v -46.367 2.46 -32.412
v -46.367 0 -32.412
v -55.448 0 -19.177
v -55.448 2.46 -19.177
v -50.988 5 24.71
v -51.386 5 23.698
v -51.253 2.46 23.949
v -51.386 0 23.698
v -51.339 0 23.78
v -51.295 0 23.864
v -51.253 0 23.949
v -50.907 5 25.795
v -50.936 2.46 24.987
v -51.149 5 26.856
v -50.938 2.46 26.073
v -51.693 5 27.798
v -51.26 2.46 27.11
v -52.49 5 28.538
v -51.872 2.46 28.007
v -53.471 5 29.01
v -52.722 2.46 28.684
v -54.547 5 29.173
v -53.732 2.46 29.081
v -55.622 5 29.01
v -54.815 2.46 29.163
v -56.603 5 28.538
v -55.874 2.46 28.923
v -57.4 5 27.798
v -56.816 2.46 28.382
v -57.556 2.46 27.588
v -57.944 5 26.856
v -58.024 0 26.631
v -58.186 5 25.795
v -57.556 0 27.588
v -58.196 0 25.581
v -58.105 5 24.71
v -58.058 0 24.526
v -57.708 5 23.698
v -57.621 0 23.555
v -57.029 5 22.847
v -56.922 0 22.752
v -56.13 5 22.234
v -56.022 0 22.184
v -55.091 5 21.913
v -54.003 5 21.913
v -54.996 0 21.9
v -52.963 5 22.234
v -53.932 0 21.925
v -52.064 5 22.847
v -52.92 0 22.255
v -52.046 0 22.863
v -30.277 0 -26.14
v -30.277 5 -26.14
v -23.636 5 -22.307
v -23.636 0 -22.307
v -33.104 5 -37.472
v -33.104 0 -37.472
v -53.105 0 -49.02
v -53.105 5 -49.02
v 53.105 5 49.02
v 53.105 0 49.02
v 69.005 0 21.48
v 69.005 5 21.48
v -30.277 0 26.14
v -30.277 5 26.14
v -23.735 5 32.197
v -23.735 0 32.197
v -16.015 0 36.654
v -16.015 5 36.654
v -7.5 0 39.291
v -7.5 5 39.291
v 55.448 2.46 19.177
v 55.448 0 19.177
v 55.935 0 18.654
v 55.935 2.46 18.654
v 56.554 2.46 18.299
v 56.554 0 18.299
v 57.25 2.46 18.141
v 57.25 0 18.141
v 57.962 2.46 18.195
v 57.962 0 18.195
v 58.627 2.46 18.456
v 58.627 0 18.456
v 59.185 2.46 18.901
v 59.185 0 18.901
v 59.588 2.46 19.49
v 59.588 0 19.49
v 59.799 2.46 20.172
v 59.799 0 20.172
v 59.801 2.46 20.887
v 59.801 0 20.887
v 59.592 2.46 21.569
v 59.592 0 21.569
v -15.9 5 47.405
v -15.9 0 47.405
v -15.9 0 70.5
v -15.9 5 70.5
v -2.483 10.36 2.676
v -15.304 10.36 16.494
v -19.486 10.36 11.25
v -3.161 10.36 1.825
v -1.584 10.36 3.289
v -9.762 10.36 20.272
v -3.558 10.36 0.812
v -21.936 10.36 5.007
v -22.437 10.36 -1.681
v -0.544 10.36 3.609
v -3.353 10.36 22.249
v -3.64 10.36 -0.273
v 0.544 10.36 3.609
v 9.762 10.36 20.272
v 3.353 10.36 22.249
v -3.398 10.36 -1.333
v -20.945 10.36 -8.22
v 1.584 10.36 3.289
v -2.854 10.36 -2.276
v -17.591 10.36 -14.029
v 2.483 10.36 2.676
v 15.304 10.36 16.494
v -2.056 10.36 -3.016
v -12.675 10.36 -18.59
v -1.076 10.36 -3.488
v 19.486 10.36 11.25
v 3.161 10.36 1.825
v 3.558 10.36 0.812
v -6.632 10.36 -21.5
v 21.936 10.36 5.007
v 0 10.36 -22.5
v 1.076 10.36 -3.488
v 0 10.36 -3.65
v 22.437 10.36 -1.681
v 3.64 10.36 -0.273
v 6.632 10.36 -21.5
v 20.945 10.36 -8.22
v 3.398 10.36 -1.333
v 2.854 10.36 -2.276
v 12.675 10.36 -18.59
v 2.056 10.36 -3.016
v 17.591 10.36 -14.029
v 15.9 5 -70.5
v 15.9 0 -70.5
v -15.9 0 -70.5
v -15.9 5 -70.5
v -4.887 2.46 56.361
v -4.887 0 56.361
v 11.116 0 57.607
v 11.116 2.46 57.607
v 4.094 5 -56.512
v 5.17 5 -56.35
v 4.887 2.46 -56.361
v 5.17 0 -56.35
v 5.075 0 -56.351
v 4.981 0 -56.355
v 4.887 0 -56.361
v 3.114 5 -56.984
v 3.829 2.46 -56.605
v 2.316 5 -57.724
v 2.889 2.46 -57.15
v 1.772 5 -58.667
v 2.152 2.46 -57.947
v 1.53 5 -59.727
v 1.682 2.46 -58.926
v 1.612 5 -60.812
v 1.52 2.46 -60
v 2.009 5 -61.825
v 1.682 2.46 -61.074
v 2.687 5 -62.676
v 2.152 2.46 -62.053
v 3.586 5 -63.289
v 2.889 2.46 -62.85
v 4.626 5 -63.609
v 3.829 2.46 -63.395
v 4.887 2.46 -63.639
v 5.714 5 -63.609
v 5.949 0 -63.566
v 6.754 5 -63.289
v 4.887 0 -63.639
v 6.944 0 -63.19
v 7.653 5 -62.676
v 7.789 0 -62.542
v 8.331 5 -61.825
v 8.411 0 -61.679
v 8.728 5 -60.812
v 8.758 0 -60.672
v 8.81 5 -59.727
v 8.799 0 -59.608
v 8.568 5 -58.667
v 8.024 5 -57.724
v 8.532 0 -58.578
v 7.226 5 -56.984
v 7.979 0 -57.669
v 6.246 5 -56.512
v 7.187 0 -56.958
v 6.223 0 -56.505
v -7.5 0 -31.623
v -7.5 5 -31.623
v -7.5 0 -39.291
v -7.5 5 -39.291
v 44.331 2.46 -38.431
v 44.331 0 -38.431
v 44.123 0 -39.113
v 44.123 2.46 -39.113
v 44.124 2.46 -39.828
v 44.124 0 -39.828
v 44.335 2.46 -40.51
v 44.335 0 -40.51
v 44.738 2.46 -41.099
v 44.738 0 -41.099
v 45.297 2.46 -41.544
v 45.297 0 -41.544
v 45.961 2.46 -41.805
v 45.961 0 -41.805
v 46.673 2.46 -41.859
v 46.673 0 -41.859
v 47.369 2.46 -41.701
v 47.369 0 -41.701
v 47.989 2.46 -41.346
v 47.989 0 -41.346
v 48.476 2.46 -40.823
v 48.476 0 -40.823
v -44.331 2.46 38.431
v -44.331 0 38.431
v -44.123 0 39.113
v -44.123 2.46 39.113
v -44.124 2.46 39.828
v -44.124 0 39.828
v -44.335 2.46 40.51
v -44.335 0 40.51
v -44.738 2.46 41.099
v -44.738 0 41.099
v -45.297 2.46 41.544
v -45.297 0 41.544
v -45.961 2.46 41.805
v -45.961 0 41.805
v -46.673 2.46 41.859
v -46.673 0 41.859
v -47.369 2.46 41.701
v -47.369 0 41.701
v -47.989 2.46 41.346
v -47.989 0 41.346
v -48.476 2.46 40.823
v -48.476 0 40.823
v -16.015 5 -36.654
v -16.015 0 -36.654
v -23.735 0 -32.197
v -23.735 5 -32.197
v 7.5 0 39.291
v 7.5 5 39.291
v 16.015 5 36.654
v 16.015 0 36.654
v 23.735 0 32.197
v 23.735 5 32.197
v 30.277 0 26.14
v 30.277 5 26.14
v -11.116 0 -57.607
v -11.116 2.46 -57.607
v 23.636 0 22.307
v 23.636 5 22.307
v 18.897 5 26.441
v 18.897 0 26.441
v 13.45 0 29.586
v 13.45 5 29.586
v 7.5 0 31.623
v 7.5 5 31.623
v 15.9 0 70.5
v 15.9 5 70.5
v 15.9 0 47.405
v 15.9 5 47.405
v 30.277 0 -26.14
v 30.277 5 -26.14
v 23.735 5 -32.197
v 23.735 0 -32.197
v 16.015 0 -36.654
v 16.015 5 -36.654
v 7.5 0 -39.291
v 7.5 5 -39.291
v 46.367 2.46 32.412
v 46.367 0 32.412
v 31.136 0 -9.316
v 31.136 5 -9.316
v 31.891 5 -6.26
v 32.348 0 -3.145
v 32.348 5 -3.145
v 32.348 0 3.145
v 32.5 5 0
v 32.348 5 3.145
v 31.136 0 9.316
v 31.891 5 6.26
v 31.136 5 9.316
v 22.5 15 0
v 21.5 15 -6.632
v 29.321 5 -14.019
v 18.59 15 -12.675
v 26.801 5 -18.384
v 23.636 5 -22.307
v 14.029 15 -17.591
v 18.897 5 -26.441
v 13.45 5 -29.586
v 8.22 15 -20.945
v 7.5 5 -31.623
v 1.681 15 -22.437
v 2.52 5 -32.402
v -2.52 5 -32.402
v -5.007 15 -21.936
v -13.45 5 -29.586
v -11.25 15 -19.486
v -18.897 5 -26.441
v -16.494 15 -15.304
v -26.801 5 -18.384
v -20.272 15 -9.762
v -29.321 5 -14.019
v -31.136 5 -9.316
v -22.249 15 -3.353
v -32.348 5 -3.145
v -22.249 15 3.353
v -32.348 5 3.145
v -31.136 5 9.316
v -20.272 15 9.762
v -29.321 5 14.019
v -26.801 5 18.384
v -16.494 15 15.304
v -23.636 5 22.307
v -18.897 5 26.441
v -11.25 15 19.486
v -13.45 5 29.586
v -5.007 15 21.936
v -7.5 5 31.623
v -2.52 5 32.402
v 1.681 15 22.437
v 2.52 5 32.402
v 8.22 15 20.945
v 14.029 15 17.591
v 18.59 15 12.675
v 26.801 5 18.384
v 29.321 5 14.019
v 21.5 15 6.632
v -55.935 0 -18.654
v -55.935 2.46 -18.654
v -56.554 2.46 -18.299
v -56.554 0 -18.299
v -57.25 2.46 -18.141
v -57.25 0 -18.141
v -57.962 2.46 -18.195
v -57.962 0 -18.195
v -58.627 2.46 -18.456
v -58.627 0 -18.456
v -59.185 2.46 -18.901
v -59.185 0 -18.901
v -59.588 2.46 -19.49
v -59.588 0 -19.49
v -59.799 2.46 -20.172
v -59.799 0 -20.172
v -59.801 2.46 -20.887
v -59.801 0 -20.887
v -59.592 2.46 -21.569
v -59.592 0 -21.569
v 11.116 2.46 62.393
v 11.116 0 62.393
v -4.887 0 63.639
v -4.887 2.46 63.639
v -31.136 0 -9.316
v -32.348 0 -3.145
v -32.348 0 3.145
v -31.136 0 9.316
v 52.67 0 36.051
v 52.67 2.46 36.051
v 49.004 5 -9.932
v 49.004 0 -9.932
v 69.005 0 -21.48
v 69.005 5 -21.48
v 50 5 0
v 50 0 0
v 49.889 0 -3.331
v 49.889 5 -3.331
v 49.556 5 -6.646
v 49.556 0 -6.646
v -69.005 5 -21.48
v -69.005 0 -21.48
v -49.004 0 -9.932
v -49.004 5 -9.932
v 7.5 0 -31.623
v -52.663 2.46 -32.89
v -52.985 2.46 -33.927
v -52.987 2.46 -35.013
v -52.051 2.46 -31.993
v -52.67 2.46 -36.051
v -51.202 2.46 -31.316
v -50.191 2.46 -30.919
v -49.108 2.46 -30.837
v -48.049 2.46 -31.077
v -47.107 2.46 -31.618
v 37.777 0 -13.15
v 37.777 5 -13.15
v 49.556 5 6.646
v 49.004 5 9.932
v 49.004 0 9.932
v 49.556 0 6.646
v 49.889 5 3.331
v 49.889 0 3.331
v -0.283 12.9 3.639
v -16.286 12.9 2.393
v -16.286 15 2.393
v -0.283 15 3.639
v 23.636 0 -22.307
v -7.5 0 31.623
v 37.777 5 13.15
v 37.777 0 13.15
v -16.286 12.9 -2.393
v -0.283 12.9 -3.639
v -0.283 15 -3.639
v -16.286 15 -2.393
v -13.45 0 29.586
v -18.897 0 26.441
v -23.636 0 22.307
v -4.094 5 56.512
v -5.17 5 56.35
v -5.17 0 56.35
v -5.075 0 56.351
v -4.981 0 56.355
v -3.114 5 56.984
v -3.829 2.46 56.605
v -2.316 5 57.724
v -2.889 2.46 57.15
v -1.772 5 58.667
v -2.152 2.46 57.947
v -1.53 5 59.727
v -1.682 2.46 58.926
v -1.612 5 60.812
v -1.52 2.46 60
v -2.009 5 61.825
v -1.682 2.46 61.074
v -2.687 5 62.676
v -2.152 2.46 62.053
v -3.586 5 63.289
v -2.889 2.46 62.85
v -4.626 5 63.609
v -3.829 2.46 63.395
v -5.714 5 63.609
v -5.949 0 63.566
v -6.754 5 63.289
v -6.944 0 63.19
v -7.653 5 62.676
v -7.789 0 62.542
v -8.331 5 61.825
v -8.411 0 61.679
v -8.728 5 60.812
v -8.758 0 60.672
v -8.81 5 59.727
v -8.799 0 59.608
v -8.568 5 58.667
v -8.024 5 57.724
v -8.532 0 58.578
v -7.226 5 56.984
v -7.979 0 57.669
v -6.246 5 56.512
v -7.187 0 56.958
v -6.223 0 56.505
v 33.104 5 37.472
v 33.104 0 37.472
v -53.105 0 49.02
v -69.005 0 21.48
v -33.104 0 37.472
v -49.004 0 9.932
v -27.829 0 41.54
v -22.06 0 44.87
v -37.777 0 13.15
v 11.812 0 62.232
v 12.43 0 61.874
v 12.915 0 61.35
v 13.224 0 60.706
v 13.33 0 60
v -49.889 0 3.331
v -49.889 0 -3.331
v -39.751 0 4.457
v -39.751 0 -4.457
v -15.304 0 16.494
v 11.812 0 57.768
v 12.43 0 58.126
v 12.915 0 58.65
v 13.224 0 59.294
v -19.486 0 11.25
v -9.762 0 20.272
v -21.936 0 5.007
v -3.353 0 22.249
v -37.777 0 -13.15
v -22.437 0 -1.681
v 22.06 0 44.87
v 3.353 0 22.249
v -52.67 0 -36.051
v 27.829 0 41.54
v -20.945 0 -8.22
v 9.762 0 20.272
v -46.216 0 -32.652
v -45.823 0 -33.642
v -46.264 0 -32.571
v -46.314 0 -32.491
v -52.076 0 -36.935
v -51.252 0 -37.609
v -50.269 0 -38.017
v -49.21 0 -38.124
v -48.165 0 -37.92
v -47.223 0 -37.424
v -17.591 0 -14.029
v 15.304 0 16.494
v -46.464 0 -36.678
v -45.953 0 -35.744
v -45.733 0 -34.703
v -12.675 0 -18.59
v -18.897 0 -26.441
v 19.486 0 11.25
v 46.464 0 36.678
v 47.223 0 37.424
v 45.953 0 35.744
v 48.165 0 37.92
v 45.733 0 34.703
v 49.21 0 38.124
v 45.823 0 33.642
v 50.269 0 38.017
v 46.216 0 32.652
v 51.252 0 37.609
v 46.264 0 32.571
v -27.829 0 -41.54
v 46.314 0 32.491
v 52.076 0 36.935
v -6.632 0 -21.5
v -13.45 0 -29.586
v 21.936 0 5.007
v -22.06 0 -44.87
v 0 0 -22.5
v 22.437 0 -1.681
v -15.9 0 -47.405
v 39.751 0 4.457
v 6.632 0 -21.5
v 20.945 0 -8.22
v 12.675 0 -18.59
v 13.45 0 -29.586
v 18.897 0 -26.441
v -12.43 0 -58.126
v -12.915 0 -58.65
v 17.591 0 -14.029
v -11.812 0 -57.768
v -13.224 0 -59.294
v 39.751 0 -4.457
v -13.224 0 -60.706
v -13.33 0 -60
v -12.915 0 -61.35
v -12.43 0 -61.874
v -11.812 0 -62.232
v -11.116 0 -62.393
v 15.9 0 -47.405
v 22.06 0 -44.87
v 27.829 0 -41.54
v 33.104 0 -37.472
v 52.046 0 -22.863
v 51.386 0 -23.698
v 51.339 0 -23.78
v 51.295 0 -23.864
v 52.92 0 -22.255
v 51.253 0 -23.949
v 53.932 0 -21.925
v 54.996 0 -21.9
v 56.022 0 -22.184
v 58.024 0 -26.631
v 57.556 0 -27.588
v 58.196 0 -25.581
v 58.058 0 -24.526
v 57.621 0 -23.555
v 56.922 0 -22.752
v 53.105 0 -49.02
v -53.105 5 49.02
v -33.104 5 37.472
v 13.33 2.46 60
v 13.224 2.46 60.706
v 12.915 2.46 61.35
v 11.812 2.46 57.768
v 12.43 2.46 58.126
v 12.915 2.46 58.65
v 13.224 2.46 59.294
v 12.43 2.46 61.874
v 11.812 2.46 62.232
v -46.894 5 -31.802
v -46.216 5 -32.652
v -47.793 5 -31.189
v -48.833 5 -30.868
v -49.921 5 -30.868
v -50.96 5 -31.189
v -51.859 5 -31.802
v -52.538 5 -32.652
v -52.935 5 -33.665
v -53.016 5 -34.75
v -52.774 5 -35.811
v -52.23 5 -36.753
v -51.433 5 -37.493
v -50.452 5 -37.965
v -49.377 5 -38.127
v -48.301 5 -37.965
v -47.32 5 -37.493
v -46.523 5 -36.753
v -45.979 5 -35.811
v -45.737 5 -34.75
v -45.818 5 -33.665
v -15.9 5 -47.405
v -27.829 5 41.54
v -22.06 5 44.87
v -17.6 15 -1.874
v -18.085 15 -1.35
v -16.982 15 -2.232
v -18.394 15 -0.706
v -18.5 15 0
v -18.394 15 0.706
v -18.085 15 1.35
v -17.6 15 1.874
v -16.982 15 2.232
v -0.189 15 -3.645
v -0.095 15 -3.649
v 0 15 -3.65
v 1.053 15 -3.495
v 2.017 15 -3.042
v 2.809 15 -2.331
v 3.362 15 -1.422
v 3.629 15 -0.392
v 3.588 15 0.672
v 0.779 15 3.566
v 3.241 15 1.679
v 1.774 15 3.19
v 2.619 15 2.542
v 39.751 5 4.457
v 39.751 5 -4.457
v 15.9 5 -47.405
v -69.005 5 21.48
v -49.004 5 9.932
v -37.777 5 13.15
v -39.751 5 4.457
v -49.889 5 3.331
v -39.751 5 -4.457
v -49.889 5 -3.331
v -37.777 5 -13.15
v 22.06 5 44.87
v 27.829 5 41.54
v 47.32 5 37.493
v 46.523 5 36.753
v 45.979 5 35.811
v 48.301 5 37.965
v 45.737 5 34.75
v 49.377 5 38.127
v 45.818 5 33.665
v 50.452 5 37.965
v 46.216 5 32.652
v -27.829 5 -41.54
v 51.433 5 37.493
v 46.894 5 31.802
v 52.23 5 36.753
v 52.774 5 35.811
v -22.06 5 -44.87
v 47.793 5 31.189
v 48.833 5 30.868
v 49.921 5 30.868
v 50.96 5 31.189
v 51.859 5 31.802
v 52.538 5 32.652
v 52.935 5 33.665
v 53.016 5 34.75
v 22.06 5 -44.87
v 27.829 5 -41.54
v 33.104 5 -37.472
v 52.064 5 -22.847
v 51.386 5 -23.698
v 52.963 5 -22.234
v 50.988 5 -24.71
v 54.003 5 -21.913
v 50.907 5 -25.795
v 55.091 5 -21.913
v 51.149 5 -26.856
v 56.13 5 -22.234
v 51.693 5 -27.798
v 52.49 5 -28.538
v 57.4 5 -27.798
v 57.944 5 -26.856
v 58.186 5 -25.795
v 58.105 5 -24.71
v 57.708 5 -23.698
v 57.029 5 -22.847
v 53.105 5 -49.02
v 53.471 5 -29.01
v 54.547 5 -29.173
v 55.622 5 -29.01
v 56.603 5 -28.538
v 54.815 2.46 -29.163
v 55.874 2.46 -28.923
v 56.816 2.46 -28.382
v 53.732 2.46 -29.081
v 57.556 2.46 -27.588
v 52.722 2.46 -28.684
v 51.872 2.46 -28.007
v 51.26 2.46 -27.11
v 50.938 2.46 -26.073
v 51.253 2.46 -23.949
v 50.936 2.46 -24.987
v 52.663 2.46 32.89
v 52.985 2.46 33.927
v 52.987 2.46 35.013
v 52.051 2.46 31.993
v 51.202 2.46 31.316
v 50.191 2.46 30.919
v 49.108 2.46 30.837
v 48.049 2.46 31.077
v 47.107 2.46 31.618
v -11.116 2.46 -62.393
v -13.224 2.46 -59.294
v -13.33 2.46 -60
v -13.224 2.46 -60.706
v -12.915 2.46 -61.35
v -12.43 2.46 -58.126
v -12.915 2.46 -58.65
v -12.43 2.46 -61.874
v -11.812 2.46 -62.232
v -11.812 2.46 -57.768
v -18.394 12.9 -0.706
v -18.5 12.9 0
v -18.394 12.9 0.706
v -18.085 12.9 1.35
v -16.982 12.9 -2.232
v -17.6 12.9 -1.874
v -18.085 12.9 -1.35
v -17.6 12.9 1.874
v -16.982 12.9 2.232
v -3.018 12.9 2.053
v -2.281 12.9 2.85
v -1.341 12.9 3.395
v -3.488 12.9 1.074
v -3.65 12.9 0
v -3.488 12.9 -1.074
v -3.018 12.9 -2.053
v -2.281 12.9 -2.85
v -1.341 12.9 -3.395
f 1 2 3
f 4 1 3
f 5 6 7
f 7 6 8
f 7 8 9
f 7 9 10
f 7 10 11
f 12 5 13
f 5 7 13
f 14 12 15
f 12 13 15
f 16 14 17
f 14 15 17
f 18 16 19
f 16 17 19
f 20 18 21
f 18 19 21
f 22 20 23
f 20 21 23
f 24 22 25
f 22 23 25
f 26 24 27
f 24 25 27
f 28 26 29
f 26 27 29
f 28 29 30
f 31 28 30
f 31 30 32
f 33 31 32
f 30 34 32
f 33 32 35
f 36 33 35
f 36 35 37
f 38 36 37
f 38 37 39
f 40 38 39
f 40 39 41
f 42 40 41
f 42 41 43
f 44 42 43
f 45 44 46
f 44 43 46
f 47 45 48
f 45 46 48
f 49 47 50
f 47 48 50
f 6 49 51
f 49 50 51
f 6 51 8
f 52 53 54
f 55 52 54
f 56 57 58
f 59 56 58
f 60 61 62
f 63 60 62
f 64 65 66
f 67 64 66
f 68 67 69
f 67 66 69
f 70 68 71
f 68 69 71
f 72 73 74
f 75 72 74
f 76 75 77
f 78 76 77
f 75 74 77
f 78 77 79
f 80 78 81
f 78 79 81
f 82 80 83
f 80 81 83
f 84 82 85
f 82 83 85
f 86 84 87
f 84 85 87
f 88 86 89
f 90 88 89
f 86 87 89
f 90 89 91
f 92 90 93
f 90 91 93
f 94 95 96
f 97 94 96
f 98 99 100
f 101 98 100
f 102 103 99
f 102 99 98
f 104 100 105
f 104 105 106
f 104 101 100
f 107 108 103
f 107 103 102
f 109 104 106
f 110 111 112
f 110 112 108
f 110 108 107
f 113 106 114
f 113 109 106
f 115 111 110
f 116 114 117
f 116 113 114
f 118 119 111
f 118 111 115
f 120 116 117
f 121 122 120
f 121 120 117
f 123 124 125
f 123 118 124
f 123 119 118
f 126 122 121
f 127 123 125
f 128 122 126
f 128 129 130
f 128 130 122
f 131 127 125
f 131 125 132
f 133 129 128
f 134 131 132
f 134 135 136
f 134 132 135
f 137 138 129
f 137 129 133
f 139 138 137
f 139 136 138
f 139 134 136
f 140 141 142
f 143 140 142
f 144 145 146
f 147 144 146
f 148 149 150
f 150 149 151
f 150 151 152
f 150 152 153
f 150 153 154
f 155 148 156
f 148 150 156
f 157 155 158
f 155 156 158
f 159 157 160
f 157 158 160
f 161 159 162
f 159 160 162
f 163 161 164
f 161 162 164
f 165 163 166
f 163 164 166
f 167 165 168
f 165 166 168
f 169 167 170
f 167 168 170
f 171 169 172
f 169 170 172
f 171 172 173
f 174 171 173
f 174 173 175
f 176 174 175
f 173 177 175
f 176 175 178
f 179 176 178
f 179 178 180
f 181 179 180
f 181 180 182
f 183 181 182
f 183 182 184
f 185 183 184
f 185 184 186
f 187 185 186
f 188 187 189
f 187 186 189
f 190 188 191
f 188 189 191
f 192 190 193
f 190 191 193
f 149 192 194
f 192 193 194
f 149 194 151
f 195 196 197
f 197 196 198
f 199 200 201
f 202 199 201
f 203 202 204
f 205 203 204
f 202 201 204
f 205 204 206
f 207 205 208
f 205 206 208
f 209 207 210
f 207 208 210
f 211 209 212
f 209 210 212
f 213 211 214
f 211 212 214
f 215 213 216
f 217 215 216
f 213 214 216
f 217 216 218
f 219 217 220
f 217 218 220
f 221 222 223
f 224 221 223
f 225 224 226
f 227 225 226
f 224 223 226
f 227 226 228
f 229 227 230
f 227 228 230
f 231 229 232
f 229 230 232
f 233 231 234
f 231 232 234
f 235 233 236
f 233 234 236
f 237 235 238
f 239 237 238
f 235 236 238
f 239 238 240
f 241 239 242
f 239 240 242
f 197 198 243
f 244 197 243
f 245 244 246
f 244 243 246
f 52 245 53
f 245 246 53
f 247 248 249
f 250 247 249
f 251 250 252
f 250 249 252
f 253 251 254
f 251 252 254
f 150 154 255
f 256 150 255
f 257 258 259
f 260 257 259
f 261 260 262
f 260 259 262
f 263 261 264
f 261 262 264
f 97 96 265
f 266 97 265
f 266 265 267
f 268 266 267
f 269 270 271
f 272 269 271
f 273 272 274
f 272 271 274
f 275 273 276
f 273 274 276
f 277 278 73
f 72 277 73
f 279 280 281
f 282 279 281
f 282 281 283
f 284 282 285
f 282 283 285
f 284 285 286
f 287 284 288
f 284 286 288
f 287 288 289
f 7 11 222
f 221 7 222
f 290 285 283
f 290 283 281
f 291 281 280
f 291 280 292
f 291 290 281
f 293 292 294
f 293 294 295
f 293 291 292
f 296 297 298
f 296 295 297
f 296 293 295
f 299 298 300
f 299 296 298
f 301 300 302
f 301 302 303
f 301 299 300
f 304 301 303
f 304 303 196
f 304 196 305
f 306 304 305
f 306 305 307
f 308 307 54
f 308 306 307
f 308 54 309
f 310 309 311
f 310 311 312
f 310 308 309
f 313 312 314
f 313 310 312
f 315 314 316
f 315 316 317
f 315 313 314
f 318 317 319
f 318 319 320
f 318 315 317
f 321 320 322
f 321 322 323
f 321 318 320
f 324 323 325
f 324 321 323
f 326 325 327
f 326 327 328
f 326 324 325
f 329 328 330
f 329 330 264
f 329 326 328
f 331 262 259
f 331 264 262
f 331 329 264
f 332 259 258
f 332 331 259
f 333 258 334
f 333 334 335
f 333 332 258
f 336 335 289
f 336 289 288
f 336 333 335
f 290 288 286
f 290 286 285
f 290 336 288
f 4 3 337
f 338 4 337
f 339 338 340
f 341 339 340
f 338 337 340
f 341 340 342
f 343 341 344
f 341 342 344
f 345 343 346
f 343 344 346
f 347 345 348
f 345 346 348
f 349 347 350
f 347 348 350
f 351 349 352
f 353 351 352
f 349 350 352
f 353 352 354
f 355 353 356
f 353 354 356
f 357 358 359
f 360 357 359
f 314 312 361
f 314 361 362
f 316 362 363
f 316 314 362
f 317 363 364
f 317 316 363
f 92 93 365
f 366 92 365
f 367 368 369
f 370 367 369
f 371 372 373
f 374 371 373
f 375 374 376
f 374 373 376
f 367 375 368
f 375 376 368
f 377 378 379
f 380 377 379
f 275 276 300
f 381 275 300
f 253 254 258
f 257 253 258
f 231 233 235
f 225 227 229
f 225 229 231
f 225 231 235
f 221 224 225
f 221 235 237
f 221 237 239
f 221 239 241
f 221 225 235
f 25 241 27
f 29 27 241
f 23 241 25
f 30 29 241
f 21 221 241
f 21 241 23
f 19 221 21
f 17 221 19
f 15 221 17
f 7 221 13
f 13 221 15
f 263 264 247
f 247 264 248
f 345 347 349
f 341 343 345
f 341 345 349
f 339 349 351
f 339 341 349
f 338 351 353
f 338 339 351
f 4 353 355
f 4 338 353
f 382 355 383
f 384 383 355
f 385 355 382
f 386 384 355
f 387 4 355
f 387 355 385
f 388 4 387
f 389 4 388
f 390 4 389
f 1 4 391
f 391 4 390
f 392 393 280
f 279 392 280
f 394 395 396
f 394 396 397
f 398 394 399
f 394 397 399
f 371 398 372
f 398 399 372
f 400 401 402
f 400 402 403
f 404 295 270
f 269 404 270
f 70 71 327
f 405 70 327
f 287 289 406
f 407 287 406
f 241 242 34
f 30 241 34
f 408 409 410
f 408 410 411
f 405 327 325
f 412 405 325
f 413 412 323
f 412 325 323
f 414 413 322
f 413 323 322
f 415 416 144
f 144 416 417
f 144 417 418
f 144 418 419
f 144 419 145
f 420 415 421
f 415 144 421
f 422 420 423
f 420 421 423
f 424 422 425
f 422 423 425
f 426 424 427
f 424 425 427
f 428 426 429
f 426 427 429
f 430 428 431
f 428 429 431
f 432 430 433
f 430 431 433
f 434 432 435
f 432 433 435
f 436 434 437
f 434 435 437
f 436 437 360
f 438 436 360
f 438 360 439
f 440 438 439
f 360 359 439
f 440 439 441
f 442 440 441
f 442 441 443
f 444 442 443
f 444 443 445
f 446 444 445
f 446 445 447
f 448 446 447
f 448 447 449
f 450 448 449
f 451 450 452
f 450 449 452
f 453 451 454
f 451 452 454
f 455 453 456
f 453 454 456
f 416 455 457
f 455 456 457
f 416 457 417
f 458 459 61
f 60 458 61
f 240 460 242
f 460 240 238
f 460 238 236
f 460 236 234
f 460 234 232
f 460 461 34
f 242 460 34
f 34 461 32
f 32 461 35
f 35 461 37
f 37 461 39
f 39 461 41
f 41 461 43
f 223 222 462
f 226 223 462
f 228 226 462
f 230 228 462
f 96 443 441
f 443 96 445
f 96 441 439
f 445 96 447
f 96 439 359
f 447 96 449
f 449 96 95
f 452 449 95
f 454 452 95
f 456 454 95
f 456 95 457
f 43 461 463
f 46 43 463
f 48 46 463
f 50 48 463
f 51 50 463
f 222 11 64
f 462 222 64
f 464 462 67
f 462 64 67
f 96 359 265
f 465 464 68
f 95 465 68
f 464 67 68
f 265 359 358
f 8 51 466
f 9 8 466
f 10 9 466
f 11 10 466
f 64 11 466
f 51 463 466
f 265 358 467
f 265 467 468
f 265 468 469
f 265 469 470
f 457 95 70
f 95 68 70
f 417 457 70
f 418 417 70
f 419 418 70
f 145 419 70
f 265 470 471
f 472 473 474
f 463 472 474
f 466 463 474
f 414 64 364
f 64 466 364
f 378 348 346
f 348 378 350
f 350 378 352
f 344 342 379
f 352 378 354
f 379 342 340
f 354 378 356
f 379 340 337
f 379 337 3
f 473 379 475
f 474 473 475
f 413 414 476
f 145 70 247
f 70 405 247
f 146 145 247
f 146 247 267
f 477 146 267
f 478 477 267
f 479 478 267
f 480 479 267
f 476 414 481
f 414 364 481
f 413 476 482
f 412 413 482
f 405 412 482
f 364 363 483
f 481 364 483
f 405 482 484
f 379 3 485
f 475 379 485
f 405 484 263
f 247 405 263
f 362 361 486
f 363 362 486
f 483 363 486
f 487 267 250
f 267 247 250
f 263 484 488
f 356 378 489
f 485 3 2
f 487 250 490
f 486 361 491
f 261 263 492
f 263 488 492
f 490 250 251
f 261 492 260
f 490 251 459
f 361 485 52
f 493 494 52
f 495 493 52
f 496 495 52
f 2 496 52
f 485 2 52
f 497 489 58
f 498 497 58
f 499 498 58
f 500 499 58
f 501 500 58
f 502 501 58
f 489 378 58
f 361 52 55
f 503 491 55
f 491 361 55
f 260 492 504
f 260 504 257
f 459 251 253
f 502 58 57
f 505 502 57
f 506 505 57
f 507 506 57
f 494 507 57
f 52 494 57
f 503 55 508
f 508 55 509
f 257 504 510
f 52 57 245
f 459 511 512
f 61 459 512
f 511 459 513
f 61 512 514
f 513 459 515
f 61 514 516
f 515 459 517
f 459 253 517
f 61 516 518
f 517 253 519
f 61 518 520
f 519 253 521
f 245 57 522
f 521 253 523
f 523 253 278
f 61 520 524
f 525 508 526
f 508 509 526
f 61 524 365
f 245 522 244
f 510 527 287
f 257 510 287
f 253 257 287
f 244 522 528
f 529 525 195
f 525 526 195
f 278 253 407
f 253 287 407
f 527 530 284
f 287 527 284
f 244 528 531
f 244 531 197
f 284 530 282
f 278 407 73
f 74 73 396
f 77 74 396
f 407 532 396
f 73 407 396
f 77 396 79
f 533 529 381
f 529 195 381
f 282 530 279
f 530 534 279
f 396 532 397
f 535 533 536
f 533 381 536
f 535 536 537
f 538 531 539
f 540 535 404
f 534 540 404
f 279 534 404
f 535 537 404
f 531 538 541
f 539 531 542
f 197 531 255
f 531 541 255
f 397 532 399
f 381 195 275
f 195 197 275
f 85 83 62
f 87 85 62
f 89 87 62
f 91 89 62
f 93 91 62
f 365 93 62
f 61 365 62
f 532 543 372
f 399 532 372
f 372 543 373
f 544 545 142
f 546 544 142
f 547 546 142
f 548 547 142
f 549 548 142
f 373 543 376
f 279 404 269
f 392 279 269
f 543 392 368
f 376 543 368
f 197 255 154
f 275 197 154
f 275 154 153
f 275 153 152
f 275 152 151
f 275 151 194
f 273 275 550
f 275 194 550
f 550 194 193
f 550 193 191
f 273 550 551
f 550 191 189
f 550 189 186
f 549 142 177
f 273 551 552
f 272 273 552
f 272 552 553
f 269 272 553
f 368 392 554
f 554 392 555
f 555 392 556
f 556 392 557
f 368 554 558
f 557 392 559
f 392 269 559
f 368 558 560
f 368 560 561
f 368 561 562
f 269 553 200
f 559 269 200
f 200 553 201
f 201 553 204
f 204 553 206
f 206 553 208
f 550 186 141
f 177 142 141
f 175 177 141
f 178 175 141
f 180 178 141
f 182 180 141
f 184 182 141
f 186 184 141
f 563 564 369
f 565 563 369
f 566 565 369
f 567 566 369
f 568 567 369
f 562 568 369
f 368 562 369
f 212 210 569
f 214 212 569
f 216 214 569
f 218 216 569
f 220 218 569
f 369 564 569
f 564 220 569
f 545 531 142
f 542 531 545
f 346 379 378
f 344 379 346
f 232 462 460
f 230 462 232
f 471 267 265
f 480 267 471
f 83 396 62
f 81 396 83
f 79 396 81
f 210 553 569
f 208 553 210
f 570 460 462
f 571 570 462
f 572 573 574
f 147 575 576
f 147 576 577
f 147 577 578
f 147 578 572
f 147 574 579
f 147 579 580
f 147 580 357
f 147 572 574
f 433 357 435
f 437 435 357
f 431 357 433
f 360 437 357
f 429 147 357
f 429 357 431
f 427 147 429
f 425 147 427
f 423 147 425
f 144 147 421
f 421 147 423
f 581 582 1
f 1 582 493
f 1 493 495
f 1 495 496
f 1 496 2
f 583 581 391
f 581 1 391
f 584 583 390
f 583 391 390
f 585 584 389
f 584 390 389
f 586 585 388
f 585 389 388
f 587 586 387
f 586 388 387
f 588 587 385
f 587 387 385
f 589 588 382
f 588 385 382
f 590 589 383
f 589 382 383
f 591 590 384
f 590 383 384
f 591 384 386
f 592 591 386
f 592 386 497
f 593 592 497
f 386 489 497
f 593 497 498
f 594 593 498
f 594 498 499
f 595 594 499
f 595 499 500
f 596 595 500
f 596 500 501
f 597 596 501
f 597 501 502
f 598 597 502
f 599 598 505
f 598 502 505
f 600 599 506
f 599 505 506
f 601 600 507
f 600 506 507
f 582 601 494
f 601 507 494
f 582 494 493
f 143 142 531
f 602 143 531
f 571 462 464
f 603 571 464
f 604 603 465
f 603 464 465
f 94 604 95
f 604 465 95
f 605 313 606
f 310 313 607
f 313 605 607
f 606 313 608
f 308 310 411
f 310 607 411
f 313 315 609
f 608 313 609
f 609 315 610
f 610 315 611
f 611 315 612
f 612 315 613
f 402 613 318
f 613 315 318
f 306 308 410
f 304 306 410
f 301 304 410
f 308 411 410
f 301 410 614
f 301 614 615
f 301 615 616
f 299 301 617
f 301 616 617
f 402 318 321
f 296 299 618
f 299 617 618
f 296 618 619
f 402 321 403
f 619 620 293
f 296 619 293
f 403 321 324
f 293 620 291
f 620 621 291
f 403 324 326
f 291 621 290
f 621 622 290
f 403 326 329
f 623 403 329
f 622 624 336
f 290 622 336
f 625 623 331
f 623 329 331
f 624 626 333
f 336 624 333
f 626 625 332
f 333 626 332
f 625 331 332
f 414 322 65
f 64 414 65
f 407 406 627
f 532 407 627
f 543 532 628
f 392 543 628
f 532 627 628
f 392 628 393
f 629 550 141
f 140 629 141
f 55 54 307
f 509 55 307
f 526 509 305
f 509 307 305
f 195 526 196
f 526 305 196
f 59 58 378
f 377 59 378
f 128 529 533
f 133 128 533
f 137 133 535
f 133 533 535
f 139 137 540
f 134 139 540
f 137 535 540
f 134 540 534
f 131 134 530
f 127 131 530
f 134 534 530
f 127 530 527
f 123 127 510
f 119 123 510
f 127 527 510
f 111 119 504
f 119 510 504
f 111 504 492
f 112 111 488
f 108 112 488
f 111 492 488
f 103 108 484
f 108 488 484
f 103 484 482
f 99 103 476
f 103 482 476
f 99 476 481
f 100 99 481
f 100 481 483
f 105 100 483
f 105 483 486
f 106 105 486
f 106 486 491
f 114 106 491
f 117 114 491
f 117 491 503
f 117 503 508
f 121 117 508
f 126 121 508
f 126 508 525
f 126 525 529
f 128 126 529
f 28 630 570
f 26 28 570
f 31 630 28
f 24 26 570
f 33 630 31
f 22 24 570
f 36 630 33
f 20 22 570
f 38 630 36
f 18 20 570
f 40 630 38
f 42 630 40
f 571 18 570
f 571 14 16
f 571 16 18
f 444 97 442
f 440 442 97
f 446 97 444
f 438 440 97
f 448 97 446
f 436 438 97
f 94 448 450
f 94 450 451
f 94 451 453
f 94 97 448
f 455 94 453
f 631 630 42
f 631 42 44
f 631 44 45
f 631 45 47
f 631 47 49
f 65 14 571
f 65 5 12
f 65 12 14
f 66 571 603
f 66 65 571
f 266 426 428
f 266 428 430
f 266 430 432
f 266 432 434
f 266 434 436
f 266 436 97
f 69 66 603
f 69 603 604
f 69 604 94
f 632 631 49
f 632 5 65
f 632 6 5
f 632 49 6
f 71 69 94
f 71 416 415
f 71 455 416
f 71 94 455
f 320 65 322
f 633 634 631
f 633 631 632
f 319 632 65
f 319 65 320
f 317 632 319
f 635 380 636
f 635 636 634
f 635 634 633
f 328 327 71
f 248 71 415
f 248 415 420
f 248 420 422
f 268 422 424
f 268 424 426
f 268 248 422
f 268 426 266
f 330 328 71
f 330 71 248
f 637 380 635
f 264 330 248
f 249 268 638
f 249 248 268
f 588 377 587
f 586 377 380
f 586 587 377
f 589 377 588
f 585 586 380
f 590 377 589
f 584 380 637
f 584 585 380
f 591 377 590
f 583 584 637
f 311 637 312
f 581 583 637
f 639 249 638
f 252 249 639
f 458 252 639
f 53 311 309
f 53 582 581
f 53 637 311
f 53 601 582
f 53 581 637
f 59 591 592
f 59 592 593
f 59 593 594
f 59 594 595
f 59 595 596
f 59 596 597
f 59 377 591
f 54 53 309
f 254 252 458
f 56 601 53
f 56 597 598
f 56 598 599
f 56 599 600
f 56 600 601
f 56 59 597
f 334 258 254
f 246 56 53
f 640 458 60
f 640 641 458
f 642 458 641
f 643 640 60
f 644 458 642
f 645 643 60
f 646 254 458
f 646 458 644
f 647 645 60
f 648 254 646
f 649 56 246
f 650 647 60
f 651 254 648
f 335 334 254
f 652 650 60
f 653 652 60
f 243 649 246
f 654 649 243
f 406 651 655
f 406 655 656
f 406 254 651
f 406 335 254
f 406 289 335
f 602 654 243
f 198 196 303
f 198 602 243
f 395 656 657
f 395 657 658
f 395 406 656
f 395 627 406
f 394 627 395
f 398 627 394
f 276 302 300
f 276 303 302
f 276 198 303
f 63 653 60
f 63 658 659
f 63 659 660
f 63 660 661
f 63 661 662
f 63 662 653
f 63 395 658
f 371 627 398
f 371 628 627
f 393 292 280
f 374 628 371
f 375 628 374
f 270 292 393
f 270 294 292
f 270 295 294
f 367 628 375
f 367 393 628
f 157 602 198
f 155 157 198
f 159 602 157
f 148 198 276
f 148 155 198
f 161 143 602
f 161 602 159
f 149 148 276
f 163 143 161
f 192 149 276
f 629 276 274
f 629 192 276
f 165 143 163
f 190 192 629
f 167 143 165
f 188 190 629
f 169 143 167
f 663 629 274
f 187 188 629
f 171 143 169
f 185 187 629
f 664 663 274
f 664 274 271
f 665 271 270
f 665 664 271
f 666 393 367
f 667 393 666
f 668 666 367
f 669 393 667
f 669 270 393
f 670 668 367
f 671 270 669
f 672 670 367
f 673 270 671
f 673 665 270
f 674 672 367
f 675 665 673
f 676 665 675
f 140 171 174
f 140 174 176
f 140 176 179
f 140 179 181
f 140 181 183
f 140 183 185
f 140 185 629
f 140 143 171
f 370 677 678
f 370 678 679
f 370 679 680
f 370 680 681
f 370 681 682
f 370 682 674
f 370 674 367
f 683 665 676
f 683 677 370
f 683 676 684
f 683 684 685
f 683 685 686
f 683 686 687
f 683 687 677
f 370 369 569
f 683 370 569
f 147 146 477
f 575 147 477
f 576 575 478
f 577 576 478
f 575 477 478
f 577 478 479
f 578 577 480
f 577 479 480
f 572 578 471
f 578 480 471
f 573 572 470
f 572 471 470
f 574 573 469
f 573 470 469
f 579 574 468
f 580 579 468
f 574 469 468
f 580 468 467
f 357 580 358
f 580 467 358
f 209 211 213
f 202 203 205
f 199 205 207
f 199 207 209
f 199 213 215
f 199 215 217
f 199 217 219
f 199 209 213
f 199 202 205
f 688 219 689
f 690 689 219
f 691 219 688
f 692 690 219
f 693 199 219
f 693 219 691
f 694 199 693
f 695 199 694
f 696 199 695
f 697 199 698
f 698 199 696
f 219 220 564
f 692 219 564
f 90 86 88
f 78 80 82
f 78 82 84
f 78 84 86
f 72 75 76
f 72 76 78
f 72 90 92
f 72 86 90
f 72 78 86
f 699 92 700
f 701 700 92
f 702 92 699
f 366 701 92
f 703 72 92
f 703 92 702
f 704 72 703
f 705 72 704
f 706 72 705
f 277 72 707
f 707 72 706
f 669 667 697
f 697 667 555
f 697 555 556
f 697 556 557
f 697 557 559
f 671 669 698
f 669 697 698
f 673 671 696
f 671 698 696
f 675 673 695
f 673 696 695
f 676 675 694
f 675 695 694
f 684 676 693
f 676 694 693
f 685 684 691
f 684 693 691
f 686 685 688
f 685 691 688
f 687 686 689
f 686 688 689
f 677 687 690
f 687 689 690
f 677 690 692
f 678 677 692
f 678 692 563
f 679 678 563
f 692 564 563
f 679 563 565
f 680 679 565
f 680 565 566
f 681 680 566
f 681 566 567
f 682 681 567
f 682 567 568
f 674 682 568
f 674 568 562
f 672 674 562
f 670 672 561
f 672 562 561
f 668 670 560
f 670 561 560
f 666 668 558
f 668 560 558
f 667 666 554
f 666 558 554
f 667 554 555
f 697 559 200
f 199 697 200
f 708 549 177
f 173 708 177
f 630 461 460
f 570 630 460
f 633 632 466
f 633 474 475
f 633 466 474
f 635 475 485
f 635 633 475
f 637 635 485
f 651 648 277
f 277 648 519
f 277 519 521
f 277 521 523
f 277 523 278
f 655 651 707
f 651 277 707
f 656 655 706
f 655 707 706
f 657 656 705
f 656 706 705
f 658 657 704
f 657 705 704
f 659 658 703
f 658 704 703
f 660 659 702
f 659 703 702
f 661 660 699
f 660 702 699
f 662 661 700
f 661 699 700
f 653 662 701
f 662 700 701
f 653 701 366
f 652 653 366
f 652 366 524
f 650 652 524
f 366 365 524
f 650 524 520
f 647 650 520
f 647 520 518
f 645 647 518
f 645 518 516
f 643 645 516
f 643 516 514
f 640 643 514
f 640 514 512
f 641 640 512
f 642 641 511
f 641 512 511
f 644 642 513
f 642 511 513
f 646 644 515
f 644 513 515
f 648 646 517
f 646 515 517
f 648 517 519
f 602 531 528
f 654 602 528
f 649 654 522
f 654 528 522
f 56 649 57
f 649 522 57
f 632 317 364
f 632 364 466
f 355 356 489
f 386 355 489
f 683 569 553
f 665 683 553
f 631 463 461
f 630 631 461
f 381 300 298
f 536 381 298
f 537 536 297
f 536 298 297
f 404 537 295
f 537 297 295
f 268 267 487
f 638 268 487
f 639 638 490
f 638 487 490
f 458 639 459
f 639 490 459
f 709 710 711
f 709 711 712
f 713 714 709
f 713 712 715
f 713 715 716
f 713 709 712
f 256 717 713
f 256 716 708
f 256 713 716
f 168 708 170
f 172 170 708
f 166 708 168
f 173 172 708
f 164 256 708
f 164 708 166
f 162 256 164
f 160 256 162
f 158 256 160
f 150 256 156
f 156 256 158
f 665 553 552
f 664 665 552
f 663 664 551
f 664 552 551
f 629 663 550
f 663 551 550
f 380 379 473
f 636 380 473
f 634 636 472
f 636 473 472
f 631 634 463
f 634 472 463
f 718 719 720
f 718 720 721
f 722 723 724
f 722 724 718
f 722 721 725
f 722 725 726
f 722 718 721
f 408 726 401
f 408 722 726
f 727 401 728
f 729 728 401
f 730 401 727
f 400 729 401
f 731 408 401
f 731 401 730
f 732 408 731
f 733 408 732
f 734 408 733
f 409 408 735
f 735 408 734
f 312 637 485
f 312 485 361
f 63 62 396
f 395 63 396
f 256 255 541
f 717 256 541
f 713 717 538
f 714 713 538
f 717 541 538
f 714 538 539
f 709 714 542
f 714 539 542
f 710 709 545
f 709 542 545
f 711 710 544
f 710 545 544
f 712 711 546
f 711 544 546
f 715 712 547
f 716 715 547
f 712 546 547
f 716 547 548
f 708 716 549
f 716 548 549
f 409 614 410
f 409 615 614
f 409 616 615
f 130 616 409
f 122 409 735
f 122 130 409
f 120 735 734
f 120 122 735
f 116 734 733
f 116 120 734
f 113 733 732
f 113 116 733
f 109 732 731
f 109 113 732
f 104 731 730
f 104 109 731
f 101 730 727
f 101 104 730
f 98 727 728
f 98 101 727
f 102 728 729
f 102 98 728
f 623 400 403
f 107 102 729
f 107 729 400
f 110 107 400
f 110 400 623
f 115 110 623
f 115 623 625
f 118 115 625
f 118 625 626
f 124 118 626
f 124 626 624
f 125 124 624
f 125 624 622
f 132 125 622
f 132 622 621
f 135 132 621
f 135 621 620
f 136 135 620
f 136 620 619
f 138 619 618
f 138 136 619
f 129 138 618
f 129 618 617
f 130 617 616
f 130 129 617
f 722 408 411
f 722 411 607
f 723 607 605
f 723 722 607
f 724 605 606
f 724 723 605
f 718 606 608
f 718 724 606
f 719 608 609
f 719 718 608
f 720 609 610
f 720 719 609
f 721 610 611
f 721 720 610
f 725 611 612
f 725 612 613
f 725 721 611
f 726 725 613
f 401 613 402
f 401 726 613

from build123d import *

# Parameters (mm, degrees)
BOSS_EXTRUDE1_DEPTH = 5
CIRPATTERN1_COUNT   = 3
CIRPATTERN1_ANGLE   = 120
SKETCH8_R           = 22.5
BOSS_EXTRUDE4_DEPTH = 10
SKETCH11_R          = 22.5
CUT_EXTRUDE4_DEPTH  = 11.7
SKETCH12_R          = 4
CUT_EXTRUDE5_DEPTH  = 3.3
SKETCH14_R          = 3.65
CUT_EXTRUDE7_DEPTH  = 100.784323589
CIRPATTERN2_COUNT   = 6
CUT_EXTRUDE9_DEPTH  = 15
SKETCH16_R          = 2.4
SKETCH16_R_2        = 3.65
CUT_EXTRUDE10_DEPTH = 2.46
CIRPATTERN3_COUNT   = 6
SKETCH17_R          = 4
SKETCH17_R_2        = 3.65
BOSS_EXTRUDE5_DEPTH = 3.3
CUT_EXTRUDE11_START = -2.1
SKETCH18_R          = 2.4
SKETCH18_R_2        = 3.65
CUT_EXTRUDE11_DEPTH = 2.1
BOSS_EXTRUDE6_START = 1.34
SKETCH21_R          = 22.5
BOSS_EXTRUDE6_DEPTH = 1.34
CUT_EXTRUDE12_START = -10.34
SKETCH22_R          = 3.65
CUT_EXTRUDE12_DEPTH = 10.34


# Read off the part's stored shape, not the designer's step: Boundary2
with BuildPart() as part:
    # Sketch1 → Boss-Extrude1 (new body)
    with BuildSketch(Plane(origin=(0, 0, 0), x_dir=(1, 0, 0), z_dir=(0, 1, 0))):
        with BuildLine():
            ThreePointArc((-15.9, 47.404535648), (-50, 0), (-15.9, -47.404535648))
            Line((-15.9, -47.404535648), (-15.9, 47.404535648))
        make_face()
        with BuildLine():
            ThreePointArc((-15.9, -47.404535648), (0, -50), (15.9, -47.404535648))
            Line((15.9, -47.404535648), (15.9, 47.404535648))
            ThreePointArc((15.9, 47.404535648), (0, 50), (-15.9, 47.404535648))
            Line((-15.9, 47.404535648), (-15.9, -47.404535648))
        make_face()
        with BuildLine():
            Line((-15.9, -70.5), (15.9, -70.5))
            Line((15.9, -70.5), (15.9, -47.404535648))
            ThreePointArc((15.9, -47.404535648), (0, -50), (-15.9, -47.404535648))
            Line((-15.9, -47.404535648), (-15.9, -70.5))
        make_face()
        with BuildLine():
            ThreePointArc((-15.9, 47.404535648), (0, 50), (15.9, 47.404535648))
            Line((15.9, 47.404535648), (15.9, 70.5))
            Line((15.9, 70.5), (-15.9, 70.5))
            Line((-15.9, 70.5), (-15.9, 47.404535648))
        make_face()
        with BuildLine():
            Line((15.9, 47.404535648), (15.9, -47.404535648))
            ThreePointArc((15.9, -47.404535648), (40.589407485, -29.197602641), (50, 0))
            ThreePointArc((50, 0), (40.589407485, 29.197602641), (15.9, 47.404535648))
        make_face()
    boss_extrude1 = extrude(amount=BOSS_EXTRUDE1_DEPTH)

    # CirPattern1: Boss-Extrude1 ×3 about axis
    cirpattern1_axis = Axis((0, 0, 0), (0, 1, 0))
    for i in range(1, CIRPATTERN1_COUNT):
        add(boss_extrude1.rotate(cirpattern1_axis, i * CIRPATTERN1_ANGLE / (CIRPATTERN1_COUNT - 1)))

    # Sketch8 → Boss-Extrude4 (add)
    with BuildSketch(Plane(origin=(0, 5, 0), x_dir=(1, 0, 0), z_dir=(0, 1, 0))):
        with Locations(Location((0, 0, 0), (0, 0, 270))):
            Circle(SKETCH8_R)
    extrude(amount=BOSS_EXTRUDE4_DEPTH)

    # Boundary2 outline → Boundary2 (revolve)
    with BuildSketch(Plane.XY):
        Polygon((32.5, 5), (22.499998072, 15.000001928), (22.5, 5), align=None)
    revolve(axis=Axis((0, 0, 0), (0, 1, 0)))

    # Sketch11 → Cut-Extrude4 (cut)
    with BuildSketch(Plane.XZ):
        with Locations(Location((0, 0, 0), (0, 0, 270))):
            Circle(SKETCH11_R)
    extrude(amount=-CUT_EXTRUDE4_DEPTH, mode=Mode.SUBTRACT)

    # Sketch12 → Cut-Extrude5 (cut)
    with BuildSketch(Plane.XZ.offset(-11.7)):
        with Locations(Location((0, 0, 0), (0, 0, 270))):
            Circle(SKETCH12_R)
    extrude(amount=-CUT_EXTRUDE5_DEPTH, mode=Mode.SUBTRACT)

    # Sketch14 → Cut-Extrude7 (cut, through all)
    with BuildSketch(Plane(origin=(0, 0, 0), x_dir=(-1, 0, 0), z_dir=(0, -1, 0))):
        with Locations(Location((5.17, -60, 0), (0, 0, 90))):
            Circle(SKETCH14_R)
    cut_extrude7 = extrude(amount=-CUT_EXTRUDE7_DEPTH, mode=Mode.SUBTRACT)

    # CirPattern2: Cut-Extrude7 ×6 about axis
    cirpattern2_axis = Axis((0, 0, 0), (0, 1, 0))
    for i in range(1, CIRPATTERN2_COUNT):
        add(cut_extrude7.rotate(cirpattern2_axis, i * 360 / CIRPATTERN2_COUNT), mode=Mode.SUBTRACT)

    # Sketch15 → Cut-Extrude9 (cut)
    with BuildSketch(Plane(origin=(0, 5, 0), x_dir=(1, 0, 0), z_dir=(0, 1, 0))):
        with BuildLine():
            Line((-37.776643972, 13.150101528), (-31.136127875, 9.316197772))
            ThreePointArc((-31.136127875, 9.316197772), (-32.5, 0), (-31.136127875, -9.316197772))
            Line((-31.136127875, -9.316197772), (-37.776643972, -13.150101528))
            ThreePointArc((-37.776643972, -13.150101528), (-40, 0), (-37.776643972, 13.150101528))
        make_face()
        with BuildLine():
            Line((-30.276643972, 26.140482585), (-23.636127875, 22.306578829))
            ThreePointArc((-23.636127875, 22.306578829), (-16.25, 28.145825623), (-7.5, 31.622776602))
            Line((-7.5, 31.622776602), (-7.5, 39.290584114))
            ThreePointArc((-7.5, 39.290584114), (-20, 34.641016151), (-30.276643972, 26.140482585))
        make_face()
        with BuildLine():
            Line((7.5, 39.290584114), (7.5, 31.622776602))
            ThreePointArc((7.5, 31.622776602), (16.25, 28.145825623), (23.636127875, 22.306578829))
            Line((23.636127875, 22.306578829), (30.276643972, 26.140482585))
            ThreePointArc((30.276643972, 26.140482585), (20, 34.641016151), (7.5, 39.290584114))
        make_face()
        with BuildLine():
            Line((37.776643972, 13.150101528), (31.136127875, 9.316197772))
            ThreePointArc((31.136127875, 9.316197772), (32.5, 0), (31.136127875, -9.316197772))
            Line((31.136127875, -9.316197772), (37.776643972, -13.150101528))
            ThreePointArc((37.776643972, -13.150101528), (40, 0), (37.776643972, 13.150101528))
        make_face()
        with BuildLine():
            Line((30.276643972, -26.140482585), (23.636127875, -22.306578829))
            ThreePointArc((23.636127875, -22.306578829), (16.25, -28.145825623), (7.5, -31.622776602))
            Line((7.5, -31.622776602), (7.5, -39.290584114))
            ThreePointArc((7.5, -39.290584114), (20, -34.641016151), (30.276643972, -26.140482585))
        make_face()
        with BuildLine():
            Line((-7.5, -39.290584114), (-7.5, -31.622776602))
            ThreePointArc((-7.5, -31.622776602), (-16.25, -28.145825623), (-23.636127875, -22.306578829))
            Line((-23.636127875, -22.306578829), (-30.276643972, -26.140482585))
            ThreePointArc((-30.276643972, -26.140482585), (-20, -34.641016151), (-7.5, -39.290584114))
        make_face()
    extrude(amount=-CUT_EXTRUDE9_DEPTH, mode=Mode.SUBTRACT)

    # Sketch16 → Cut-Extrude10 (cut)
    with BuildSketch(Plane.XZ):
        with Locations((-10.93, -60)):
            Circle(SKETCH16_R)
        with BuildLine():
            Line((4.886614907, -56.361017603), (-11.116335404, -57.607244451))
            ThreePointArc((-11.116335404, -57.607244451), (-9.300154144, -58.238295574), (-8.53, -60))
            ThreePointArc((-8.53, -60), (-9.300154144, -61.761704426), (-11.116335404, -62.392755549))
            Line((-11.116335404, -62.392755549), (4.886614907, -63.638982397))
            ThreePointArc((4.886614907, -63.638982397), (1.52, -60), (4.886614907, -56.361017603))
        make_face()
        with Locations(Location((5.17, -60, 0), (0, 0, 94.452911391))):
            Circle(SKETCH16_R_2)
    cut_extrude10 = extrude(amount=-CUT_EXTRUDE10_DEPTH, mode=Mode.SUBTRACT)

    # CirPattern3: Cut-Extrude10 ×6 about axis
    cirpattern3_axis = Axis((0, 0, 0), (0, 1, 0))
    for i in range(1, CIRPATTERN3_COUNT):
        add(cut_extrude10.rotate(cirpattern3_axis, i * 360 / CIRPATTERN3_COUNT), mode=Mode.SUBTRACT)

    # Sketch17 → Boss-Extrude5 (add)
    with BuildSketch(Plane.XZ.offset(-11.7)):
        Circle(SKETCH17_R)
        with Locations(Location((0, 0, 0), (0, 0, 270))):
            Circle(SKETCH17_R_2, mode=Mode.SUBTRACT)
    extrude(amount=-BOSS_EXTRUDE5_DEPTH)

    # Sketch18 → Cut-Extrude11 (cut)
    with BuildSketch(Plane(origin=(0, 15, 0), x_dir=(1, 0, 0), z_dir=(0, 1, 0)).offset(CUT_EXTRUDE11_START)):
        with BuildLine():
            Line((-16.286335404, -2.392755549), (-0.283385093, -3.638982397))
            ThreePointArc((-0.283385093, -3.638982397), (-3.65, 0), (-0.283385093, 3.638982397))
            Line((-0.283385093, 3.638982397), (-16.286335404, 2.392755549))
            ThreePointArc((-16.286335404, 2.392755549), (-14.470154144, 1.761704426), (-13.7, 0))
            ThreePointArc((-13.7, 0), (-14.470154144, -1.761704426), (-16.286335404, -2.392755549))
        make_face()
        with Locations((-16.1, 0)):
            Circle(SKETCH18_R)
        with Locations(Location((0, 0, 0), (0, 0, 90))):
            Circle(SKETCH18_R_2)
    extrude(amount=CUT_EXTRUDE11_DEPTH, mode=Mode.SUBTRACT)

    # Sketch21 → Boss-Extrude6 (add)
    with BuildSketch(Plane(origin=(0, 11.7, 0), x_dir=(-1, 0, 0), z_dir=(0, -1, 0)).offset(BOSS_EXTRUDE6_START)):
        with Locations(Location((0, 0, 0), (0, 0, 90))):
            Circle(SKETCH21_R)
    extrude(amount=-BOSS_EXTRUDE6_DEPTH)

    # Sketch22 → Cut-Extrude12 (cut)
    with BuildSketch(Plane(origin=(0, 15, 0), x_dir=(1, 0, 0), z_dir=(0, 1, 0)).offset(CUT_EXTRUDE12_START)):
        with Locations(Location((0, 0, 0), (0, 0, 90))):
            Circle(SKETCH22_R)
    extrude(amount=CUT_EXTRUDE12_DEPTH, mode=Mode.SUBTRACT)


solid = part.part
